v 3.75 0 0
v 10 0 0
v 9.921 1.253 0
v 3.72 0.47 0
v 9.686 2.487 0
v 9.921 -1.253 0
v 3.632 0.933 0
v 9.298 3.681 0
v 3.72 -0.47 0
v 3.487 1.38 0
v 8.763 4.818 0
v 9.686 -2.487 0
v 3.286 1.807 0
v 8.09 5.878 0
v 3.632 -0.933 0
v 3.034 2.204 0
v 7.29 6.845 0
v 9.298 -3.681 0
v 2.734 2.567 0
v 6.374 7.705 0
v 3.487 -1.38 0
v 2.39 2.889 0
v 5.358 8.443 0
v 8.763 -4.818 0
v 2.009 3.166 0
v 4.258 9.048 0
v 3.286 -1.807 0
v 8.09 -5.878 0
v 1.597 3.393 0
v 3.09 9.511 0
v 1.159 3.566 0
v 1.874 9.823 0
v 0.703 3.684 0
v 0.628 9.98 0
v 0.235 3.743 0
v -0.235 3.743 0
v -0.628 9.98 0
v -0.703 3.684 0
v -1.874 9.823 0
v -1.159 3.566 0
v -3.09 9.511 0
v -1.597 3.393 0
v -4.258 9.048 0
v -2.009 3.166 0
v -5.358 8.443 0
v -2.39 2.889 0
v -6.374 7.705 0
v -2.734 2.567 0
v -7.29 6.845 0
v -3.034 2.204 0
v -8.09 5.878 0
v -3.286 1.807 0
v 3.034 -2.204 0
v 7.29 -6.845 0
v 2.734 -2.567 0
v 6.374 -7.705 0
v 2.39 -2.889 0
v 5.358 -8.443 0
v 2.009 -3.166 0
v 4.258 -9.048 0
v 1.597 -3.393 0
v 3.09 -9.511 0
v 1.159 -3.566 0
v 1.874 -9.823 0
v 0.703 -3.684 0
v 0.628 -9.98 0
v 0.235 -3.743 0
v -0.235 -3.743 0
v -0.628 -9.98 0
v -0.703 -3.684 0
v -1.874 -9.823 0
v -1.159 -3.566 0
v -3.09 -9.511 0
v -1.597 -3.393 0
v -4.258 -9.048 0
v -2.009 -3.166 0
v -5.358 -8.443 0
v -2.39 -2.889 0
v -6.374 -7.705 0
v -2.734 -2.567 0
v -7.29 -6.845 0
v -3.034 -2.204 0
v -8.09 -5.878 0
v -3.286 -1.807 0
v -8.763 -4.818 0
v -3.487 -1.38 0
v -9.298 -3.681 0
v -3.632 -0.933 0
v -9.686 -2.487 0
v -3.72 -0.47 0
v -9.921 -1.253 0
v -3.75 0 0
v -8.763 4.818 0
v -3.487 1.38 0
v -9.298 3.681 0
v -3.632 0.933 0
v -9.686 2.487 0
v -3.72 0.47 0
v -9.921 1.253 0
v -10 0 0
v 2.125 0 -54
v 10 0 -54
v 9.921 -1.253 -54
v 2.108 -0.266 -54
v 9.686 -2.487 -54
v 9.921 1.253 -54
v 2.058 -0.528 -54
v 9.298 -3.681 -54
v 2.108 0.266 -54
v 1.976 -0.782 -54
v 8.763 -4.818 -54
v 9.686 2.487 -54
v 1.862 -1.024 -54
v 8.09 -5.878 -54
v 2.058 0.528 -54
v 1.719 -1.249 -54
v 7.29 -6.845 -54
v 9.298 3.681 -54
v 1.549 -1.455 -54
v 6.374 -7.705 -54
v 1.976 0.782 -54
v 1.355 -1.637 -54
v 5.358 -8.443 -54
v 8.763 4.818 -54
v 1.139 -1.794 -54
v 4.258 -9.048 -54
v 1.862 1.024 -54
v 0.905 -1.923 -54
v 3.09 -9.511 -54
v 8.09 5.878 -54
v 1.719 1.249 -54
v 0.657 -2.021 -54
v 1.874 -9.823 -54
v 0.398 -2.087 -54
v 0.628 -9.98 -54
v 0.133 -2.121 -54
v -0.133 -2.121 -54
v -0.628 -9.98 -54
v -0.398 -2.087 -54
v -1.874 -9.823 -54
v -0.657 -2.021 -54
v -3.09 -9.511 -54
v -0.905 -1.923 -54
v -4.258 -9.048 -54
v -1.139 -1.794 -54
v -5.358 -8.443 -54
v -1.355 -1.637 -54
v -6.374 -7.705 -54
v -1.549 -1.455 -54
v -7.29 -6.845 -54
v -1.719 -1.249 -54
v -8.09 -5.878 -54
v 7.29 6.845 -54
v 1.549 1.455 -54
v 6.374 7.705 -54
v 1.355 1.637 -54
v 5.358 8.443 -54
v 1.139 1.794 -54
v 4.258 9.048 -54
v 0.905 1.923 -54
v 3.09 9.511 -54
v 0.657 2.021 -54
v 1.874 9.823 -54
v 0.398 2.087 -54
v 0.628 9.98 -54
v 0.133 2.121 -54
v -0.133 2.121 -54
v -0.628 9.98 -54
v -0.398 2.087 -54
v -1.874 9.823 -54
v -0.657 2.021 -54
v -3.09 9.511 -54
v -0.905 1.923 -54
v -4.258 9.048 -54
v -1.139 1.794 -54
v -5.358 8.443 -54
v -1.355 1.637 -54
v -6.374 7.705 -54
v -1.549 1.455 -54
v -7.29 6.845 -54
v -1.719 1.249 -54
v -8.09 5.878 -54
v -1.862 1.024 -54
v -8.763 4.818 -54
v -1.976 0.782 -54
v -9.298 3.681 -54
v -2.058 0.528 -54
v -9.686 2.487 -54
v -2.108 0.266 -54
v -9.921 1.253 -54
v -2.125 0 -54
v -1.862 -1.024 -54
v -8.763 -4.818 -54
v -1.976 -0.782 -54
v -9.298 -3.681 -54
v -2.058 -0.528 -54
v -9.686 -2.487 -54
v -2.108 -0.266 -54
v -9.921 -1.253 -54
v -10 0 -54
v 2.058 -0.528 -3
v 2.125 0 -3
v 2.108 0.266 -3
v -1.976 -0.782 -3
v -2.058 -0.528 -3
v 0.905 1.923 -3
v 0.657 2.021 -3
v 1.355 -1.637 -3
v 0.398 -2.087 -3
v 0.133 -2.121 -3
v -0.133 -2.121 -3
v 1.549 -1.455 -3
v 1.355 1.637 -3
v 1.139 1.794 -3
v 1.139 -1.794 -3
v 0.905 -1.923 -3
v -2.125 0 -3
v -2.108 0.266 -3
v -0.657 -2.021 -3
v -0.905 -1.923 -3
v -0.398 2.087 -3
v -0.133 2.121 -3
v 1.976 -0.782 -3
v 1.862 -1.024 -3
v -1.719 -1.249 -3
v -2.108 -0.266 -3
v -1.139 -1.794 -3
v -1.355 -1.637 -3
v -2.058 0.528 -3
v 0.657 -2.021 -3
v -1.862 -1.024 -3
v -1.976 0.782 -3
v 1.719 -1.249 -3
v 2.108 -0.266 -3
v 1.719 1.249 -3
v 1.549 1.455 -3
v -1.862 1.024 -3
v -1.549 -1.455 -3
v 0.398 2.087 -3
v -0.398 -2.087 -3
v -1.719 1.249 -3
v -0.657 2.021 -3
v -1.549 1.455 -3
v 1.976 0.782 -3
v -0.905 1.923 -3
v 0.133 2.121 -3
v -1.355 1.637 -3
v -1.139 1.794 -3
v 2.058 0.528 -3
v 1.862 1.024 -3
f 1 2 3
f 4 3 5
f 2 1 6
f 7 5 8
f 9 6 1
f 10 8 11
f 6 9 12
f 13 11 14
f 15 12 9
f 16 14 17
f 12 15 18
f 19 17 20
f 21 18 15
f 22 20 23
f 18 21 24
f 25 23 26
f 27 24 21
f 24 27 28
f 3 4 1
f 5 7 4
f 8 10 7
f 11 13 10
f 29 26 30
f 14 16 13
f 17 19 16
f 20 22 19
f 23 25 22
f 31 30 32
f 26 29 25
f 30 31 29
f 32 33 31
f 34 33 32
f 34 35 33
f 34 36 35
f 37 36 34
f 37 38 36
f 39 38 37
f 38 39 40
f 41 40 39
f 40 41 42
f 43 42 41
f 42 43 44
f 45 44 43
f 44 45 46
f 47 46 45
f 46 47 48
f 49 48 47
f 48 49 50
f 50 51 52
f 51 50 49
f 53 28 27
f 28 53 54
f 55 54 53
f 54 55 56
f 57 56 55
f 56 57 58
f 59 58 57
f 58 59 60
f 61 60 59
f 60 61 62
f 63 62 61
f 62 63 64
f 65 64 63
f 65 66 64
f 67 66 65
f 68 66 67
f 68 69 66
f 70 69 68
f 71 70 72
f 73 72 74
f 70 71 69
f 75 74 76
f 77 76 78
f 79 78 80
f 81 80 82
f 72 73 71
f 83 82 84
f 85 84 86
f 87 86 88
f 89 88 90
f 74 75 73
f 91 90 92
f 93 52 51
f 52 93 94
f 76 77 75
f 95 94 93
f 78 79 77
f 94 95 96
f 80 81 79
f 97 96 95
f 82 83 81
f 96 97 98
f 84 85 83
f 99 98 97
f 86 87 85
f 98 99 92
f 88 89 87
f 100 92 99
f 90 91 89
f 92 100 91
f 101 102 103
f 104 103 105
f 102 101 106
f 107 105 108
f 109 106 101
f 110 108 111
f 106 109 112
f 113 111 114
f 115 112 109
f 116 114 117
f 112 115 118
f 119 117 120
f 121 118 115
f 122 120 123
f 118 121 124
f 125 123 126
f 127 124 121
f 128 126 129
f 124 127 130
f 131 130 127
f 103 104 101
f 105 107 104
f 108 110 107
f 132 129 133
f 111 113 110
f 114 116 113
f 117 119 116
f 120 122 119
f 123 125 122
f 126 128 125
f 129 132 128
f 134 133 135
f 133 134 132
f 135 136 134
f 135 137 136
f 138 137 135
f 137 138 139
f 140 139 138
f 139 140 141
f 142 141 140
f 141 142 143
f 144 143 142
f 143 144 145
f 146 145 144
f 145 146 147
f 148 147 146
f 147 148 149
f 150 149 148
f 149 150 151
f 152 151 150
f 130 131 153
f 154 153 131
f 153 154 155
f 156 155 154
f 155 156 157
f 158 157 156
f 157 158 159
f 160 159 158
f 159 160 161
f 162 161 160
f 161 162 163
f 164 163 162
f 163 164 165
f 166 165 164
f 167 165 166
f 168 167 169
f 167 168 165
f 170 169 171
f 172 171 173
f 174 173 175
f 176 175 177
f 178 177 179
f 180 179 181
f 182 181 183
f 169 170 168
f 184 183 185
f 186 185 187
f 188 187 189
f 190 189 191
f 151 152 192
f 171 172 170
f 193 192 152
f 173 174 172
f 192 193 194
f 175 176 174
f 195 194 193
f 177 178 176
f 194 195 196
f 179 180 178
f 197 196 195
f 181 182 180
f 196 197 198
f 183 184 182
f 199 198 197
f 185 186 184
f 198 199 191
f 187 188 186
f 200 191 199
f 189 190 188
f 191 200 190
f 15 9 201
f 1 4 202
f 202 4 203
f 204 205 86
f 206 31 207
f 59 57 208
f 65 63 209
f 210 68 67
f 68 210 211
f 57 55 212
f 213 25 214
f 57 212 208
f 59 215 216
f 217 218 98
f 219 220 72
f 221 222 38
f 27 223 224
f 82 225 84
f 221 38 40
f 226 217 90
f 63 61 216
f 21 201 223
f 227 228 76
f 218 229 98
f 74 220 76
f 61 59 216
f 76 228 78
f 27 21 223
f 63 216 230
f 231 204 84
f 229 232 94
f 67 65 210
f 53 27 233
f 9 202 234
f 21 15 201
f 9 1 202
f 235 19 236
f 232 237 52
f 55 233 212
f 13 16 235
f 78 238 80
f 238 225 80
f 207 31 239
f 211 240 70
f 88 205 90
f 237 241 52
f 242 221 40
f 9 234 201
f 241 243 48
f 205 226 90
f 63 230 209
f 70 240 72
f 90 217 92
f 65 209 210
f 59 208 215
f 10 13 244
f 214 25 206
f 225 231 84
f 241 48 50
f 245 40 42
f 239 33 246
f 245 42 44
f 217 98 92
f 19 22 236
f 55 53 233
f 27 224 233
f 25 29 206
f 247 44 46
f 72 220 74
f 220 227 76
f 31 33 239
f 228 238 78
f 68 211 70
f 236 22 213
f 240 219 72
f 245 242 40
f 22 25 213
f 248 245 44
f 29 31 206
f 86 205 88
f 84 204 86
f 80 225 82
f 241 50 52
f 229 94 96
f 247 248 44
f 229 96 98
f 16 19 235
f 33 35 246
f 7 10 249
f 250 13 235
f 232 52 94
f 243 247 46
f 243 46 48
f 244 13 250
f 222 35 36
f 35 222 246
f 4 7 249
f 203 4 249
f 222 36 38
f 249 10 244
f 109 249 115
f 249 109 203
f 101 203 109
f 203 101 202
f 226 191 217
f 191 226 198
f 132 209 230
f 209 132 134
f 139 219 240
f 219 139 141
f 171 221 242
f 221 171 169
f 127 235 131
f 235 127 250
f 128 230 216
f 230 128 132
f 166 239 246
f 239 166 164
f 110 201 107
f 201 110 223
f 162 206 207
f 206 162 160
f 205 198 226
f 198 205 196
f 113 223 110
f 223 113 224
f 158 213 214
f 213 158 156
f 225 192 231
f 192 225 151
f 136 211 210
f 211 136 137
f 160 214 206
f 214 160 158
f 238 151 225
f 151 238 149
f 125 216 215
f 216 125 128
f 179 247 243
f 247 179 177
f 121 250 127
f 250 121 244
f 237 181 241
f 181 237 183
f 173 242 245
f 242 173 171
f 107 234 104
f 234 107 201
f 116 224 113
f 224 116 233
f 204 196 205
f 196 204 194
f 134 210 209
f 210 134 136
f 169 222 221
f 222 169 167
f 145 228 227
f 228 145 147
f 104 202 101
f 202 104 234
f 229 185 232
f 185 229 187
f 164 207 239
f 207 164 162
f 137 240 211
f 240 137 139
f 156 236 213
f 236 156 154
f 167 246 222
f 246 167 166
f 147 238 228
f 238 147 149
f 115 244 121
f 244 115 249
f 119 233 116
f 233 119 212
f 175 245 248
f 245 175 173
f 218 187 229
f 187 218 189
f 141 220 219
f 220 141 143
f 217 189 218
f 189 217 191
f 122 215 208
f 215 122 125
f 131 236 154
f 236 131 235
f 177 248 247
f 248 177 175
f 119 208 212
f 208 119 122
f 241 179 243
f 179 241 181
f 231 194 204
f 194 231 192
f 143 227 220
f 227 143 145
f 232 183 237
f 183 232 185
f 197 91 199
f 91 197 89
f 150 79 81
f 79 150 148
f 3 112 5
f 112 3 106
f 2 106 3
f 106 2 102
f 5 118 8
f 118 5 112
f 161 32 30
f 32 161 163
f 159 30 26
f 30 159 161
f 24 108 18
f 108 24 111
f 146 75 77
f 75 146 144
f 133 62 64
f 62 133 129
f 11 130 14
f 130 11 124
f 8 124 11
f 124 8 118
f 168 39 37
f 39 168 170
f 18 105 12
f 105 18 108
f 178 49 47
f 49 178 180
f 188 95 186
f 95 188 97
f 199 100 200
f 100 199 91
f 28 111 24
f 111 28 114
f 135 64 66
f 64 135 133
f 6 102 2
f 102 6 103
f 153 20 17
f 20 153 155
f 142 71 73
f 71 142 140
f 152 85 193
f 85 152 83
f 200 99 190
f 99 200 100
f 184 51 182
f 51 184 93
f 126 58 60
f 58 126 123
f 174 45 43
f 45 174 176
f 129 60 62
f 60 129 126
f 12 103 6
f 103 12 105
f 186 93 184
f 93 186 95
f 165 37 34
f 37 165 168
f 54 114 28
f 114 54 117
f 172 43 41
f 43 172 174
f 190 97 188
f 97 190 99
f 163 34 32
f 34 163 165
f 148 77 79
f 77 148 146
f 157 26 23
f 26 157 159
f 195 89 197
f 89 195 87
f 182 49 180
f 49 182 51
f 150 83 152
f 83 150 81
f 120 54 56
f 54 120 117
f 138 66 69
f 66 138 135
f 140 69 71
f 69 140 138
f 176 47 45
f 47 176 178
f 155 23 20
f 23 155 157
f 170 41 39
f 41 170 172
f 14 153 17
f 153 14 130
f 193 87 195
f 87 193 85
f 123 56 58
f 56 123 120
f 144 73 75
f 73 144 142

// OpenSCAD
$fn = 50;


difference() {
	union() {
		translate(v = [0, 0, -54.0000000000]) {
			cylinder(h = 54, r = 10.0000000000);
		}
		cylinder(h = 0, r = 13.0000000000);
	}
	union() {
		translate(v = [0, 0, 0]) {
			rotate(a = [0, 0, 0]) {
				difference() {
					union() {
						#translate(v = [0, 0, -54.0000000000]) {
							cylinder(h = 54, r = 2.0000000000);
						}
						#translate(v = [0, 0, -3]) {
							cylinder(h = 3, r = 10.0000000000, r1 = 2.1250000000, r2 = 3.7500000000);
						}
						#translate(v = [0, 0, -54.0000000000]) {
							cylinder(h = 54, r = 2.1250000000);
						}
						#translate(v = [0, 0, -54.0000000000]) {
							cylinder(h = 54, r = 2.0000000000);
						}
					}
					union();
				}
			}
		}
	}
}
